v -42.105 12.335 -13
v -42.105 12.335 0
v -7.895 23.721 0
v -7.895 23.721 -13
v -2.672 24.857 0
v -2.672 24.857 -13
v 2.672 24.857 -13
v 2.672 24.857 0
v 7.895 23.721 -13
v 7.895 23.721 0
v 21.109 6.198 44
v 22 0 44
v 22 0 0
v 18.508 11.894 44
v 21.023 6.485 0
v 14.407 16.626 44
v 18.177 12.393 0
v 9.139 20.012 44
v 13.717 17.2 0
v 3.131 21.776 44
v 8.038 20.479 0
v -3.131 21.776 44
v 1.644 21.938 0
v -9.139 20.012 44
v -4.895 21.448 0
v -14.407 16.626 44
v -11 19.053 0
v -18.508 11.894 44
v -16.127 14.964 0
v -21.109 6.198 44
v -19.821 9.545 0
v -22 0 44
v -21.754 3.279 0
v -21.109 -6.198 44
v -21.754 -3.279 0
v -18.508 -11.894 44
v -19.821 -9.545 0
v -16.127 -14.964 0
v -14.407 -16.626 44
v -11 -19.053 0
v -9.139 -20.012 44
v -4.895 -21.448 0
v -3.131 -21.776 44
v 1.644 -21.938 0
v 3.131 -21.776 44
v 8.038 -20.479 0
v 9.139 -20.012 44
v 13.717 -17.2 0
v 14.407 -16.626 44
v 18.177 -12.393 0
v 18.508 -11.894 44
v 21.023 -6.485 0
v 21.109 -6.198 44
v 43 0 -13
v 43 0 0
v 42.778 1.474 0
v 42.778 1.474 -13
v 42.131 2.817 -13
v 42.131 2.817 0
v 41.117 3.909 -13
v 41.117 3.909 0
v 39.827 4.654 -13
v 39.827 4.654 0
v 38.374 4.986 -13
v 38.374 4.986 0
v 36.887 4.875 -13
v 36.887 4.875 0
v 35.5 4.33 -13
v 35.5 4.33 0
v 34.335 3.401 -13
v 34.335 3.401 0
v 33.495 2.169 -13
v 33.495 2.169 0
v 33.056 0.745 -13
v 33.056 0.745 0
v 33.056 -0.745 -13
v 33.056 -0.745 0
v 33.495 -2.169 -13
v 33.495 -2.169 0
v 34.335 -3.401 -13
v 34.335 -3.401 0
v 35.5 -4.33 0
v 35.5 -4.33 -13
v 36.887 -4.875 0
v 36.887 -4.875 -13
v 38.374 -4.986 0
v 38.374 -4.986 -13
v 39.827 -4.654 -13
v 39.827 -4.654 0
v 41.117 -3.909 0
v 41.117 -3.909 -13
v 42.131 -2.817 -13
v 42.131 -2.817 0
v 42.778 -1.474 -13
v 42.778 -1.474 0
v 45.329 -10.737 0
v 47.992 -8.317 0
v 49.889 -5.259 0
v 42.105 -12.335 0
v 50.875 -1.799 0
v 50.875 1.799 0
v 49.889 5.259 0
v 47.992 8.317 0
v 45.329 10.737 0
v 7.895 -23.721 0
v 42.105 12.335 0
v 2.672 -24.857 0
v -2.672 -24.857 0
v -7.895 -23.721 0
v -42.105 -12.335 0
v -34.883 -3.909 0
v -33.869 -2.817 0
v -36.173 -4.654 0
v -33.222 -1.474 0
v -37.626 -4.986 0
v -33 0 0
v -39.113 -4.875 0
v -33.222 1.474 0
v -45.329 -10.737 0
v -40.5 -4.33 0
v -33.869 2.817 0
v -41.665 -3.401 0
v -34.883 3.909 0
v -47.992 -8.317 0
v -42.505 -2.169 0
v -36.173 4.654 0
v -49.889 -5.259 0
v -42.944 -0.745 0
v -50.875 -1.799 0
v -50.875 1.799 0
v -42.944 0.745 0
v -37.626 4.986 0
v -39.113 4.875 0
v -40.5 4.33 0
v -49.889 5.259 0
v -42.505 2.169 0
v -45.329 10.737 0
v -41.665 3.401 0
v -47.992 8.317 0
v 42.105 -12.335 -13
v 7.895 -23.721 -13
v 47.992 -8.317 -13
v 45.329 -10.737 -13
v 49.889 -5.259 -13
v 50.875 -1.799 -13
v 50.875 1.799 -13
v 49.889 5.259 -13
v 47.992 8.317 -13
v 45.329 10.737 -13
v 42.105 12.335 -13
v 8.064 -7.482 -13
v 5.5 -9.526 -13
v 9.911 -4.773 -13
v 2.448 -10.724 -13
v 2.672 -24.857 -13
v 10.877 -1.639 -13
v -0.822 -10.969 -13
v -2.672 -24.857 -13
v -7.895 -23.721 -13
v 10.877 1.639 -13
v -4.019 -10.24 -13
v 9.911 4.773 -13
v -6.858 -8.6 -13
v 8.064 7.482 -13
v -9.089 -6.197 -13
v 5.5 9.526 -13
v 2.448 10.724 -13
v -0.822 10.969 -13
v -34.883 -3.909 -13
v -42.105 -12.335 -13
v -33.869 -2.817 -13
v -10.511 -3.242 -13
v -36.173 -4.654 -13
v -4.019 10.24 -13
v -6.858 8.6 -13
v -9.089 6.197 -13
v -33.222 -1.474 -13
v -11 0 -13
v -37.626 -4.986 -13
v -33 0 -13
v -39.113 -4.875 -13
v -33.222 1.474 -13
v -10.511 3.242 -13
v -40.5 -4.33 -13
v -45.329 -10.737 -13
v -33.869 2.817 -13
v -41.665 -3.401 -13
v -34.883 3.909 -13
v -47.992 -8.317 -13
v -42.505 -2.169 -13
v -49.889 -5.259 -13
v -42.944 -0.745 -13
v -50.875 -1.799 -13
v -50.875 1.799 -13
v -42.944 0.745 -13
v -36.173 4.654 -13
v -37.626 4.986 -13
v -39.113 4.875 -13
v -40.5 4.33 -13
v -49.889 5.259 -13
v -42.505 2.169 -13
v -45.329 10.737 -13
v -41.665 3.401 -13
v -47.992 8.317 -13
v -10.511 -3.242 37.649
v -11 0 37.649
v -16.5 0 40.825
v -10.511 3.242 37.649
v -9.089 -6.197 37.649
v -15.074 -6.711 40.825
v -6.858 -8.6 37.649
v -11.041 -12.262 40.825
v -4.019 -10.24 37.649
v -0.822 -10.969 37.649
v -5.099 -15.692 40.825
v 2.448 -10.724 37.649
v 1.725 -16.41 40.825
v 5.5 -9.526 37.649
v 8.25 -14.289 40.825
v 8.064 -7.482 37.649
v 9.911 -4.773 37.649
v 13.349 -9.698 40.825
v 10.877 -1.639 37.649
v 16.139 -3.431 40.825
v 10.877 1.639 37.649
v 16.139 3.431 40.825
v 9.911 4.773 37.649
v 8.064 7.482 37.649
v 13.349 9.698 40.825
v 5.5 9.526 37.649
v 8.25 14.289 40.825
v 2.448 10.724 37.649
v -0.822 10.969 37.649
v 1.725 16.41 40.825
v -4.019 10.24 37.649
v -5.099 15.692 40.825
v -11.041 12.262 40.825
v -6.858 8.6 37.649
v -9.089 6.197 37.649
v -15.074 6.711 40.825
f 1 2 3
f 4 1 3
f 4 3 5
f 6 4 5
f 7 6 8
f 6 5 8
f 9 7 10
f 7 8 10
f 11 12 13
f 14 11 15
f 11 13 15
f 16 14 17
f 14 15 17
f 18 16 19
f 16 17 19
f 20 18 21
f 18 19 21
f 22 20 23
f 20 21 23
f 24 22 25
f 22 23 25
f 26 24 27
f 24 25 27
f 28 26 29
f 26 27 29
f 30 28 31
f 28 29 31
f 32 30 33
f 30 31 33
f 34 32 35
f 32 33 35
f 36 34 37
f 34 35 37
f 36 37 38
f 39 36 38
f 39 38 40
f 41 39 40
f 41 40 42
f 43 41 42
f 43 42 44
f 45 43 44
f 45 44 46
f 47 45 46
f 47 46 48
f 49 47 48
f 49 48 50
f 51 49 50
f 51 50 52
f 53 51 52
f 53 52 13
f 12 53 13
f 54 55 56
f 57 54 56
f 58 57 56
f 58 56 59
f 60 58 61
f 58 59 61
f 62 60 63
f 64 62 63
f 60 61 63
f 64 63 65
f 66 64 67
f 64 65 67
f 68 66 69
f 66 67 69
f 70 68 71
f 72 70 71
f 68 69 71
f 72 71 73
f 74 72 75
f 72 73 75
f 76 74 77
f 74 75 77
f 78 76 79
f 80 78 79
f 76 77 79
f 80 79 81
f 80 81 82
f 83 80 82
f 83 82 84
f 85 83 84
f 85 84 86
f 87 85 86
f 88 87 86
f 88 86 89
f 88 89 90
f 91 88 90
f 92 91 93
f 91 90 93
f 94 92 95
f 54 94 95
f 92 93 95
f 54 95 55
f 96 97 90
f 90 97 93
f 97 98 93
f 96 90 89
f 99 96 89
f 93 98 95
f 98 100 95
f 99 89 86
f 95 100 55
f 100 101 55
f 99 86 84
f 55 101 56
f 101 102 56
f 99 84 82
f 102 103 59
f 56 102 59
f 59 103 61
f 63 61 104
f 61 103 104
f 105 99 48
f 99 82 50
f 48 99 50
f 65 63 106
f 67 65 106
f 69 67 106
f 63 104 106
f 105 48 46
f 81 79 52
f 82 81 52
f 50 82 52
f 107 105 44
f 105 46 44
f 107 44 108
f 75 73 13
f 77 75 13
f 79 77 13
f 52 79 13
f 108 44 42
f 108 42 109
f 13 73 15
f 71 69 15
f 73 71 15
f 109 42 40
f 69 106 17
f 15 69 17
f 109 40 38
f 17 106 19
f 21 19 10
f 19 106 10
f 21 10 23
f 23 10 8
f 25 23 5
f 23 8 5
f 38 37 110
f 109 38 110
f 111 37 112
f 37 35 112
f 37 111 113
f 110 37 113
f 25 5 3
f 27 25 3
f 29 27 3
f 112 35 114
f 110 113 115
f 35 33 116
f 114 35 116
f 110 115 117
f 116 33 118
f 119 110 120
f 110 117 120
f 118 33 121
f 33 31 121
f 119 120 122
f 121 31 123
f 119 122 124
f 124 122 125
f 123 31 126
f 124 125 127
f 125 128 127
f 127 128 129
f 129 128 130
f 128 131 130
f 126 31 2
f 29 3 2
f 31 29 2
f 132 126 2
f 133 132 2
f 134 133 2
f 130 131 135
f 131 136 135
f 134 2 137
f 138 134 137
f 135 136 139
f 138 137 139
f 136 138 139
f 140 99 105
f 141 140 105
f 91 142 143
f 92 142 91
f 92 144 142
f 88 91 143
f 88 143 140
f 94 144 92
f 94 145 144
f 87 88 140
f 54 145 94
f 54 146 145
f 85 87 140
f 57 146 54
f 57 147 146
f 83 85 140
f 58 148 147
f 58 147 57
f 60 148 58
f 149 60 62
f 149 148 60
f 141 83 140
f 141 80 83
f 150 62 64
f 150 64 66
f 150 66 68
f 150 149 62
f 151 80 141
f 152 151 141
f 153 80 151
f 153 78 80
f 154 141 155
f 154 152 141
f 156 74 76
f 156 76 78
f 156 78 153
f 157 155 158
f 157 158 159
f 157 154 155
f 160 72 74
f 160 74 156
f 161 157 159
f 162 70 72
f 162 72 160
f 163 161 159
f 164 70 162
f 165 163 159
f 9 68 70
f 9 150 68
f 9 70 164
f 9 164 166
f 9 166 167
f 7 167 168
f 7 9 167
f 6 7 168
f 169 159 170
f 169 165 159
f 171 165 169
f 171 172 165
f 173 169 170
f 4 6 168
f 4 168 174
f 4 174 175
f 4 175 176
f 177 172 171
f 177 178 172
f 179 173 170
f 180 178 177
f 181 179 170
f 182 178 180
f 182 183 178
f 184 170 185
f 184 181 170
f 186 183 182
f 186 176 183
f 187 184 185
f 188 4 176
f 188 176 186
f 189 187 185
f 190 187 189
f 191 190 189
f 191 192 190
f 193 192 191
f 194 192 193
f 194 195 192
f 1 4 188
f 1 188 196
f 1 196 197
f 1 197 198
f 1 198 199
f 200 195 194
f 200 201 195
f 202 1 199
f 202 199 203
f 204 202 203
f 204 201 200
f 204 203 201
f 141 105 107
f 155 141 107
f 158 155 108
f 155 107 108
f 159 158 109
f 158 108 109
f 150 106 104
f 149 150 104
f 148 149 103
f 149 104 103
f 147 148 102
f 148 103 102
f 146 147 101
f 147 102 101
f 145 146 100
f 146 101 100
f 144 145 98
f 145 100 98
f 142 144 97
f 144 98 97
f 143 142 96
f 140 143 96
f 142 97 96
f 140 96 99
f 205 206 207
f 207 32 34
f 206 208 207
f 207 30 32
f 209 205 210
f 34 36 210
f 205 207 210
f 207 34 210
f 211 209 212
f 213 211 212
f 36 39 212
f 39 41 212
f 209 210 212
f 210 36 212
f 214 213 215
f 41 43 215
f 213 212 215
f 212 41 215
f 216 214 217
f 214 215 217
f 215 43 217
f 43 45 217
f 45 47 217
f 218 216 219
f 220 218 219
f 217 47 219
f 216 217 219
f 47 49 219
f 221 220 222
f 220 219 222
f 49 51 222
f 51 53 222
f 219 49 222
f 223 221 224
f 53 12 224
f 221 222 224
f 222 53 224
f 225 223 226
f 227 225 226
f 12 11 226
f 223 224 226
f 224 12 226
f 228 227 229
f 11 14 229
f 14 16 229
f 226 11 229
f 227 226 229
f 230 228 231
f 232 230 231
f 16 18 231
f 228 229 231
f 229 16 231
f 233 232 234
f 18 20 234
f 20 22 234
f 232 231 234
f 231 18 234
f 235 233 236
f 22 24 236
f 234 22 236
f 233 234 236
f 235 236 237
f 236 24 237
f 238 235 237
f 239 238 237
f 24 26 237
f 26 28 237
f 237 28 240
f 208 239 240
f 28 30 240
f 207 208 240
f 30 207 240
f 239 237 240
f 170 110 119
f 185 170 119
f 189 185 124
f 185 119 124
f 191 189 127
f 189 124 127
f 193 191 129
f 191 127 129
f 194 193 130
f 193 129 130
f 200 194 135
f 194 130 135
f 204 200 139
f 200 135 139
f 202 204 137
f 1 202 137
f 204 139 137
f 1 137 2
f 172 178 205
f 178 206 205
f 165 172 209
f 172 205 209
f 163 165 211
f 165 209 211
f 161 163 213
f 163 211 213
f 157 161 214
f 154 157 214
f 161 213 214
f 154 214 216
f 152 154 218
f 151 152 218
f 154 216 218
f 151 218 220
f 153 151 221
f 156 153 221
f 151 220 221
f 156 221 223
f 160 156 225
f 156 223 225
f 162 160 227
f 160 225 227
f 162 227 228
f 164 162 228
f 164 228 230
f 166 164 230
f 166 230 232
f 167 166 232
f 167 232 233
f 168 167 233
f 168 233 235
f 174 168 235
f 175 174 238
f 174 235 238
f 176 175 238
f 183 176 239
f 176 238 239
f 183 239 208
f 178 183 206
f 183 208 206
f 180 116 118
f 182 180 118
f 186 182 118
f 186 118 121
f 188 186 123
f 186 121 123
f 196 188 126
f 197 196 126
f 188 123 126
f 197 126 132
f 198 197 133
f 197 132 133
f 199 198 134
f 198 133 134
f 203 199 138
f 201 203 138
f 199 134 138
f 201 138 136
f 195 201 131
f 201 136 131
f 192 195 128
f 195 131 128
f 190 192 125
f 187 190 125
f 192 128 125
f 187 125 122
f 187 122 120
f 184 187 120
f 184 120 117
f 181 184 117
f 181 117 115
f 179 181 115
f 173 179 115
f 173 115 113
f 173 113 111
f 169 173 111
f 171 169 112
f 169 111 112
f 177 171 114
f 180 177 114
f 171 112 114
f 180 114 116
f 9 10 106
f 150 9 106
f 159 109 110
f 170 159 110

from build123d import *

# Parameters (mm, degrees)
SCHIZZO2_R                   = 5
ESTRUSIONE_ESTRUSIONE1_DEPTH = 13
SCHIZZO3_R                   = 22
ESTRUSIONE_ESTRUSIONE2_DEPTH = 44


with BuildPart() as part:
    # Schizzo2 → Estrusione-Estrusione1 (new body)
    with BuildSketch(Plane.XY):
        with BuildLine():
            Line((-42.105263158, 12.334780679), (-7.894736842, 23.720732075))
            ThreePointArc((-7.894736842, 23.720732075), (0, 25), (7.894736842, 23.720732075))
            Line((7.894736842, 23.720732075), (42.105263158, 12.334780679))
            ThreePointArc((42.105263158, 12.334780679), (51, 0), (42.105263158, -12.334780679))
            Line((42.105263158, -12.334780679), (7.894736842, -23.720732075))
            ThreePointArc((7.894736842, -23.720732075), (0, -25), (-7.894736842, -23.720732075))
            Line((-7.894736842, -23.720732075), (-42.105263158, -12.334780679))
            ThreePointArc((-42.105263158, -12.334780679), (-51, 0), (-42.105263158, 12.334780679))
        make_face()
        with Locations((38, 0)):
            Circle(SCHIZZO2_R, mode=Mode.SUBTRACT)
        with Locations((-38, 0)):
            Circle(SCHIZZO2_R, mode=Mode.SUBTRACT)
    extrude(amount=-ESTRUSIONE_ESTRUSIONE1_DEPTH)

    # Schizzo3 → Estrusione-Estrusione2 (add)
    with BuildSketch(Plane.XY):
        Circle(SCHIZZO3_R)
    extrude(amount=ESTRUSIONE_ESTRUSIONE2_DEPTH)

    # Schizzo5 → Taglia-Rivoluzione2 (revolve, cut)
    with BuildSketch(Plane(origin=(0, 0, 0), x_dir=(1, 0, 0), z_dir=(0, 1, 0))):
        Polygon((0, 13), (-11, 13), (-11, -37.649147039), (-22, -44), (0, -44), align=None)
    revolve(axis=Axis((0, 0, -13), (0, 0, 1)), mode=Mode.SUBTRACT)


solid = part.part
